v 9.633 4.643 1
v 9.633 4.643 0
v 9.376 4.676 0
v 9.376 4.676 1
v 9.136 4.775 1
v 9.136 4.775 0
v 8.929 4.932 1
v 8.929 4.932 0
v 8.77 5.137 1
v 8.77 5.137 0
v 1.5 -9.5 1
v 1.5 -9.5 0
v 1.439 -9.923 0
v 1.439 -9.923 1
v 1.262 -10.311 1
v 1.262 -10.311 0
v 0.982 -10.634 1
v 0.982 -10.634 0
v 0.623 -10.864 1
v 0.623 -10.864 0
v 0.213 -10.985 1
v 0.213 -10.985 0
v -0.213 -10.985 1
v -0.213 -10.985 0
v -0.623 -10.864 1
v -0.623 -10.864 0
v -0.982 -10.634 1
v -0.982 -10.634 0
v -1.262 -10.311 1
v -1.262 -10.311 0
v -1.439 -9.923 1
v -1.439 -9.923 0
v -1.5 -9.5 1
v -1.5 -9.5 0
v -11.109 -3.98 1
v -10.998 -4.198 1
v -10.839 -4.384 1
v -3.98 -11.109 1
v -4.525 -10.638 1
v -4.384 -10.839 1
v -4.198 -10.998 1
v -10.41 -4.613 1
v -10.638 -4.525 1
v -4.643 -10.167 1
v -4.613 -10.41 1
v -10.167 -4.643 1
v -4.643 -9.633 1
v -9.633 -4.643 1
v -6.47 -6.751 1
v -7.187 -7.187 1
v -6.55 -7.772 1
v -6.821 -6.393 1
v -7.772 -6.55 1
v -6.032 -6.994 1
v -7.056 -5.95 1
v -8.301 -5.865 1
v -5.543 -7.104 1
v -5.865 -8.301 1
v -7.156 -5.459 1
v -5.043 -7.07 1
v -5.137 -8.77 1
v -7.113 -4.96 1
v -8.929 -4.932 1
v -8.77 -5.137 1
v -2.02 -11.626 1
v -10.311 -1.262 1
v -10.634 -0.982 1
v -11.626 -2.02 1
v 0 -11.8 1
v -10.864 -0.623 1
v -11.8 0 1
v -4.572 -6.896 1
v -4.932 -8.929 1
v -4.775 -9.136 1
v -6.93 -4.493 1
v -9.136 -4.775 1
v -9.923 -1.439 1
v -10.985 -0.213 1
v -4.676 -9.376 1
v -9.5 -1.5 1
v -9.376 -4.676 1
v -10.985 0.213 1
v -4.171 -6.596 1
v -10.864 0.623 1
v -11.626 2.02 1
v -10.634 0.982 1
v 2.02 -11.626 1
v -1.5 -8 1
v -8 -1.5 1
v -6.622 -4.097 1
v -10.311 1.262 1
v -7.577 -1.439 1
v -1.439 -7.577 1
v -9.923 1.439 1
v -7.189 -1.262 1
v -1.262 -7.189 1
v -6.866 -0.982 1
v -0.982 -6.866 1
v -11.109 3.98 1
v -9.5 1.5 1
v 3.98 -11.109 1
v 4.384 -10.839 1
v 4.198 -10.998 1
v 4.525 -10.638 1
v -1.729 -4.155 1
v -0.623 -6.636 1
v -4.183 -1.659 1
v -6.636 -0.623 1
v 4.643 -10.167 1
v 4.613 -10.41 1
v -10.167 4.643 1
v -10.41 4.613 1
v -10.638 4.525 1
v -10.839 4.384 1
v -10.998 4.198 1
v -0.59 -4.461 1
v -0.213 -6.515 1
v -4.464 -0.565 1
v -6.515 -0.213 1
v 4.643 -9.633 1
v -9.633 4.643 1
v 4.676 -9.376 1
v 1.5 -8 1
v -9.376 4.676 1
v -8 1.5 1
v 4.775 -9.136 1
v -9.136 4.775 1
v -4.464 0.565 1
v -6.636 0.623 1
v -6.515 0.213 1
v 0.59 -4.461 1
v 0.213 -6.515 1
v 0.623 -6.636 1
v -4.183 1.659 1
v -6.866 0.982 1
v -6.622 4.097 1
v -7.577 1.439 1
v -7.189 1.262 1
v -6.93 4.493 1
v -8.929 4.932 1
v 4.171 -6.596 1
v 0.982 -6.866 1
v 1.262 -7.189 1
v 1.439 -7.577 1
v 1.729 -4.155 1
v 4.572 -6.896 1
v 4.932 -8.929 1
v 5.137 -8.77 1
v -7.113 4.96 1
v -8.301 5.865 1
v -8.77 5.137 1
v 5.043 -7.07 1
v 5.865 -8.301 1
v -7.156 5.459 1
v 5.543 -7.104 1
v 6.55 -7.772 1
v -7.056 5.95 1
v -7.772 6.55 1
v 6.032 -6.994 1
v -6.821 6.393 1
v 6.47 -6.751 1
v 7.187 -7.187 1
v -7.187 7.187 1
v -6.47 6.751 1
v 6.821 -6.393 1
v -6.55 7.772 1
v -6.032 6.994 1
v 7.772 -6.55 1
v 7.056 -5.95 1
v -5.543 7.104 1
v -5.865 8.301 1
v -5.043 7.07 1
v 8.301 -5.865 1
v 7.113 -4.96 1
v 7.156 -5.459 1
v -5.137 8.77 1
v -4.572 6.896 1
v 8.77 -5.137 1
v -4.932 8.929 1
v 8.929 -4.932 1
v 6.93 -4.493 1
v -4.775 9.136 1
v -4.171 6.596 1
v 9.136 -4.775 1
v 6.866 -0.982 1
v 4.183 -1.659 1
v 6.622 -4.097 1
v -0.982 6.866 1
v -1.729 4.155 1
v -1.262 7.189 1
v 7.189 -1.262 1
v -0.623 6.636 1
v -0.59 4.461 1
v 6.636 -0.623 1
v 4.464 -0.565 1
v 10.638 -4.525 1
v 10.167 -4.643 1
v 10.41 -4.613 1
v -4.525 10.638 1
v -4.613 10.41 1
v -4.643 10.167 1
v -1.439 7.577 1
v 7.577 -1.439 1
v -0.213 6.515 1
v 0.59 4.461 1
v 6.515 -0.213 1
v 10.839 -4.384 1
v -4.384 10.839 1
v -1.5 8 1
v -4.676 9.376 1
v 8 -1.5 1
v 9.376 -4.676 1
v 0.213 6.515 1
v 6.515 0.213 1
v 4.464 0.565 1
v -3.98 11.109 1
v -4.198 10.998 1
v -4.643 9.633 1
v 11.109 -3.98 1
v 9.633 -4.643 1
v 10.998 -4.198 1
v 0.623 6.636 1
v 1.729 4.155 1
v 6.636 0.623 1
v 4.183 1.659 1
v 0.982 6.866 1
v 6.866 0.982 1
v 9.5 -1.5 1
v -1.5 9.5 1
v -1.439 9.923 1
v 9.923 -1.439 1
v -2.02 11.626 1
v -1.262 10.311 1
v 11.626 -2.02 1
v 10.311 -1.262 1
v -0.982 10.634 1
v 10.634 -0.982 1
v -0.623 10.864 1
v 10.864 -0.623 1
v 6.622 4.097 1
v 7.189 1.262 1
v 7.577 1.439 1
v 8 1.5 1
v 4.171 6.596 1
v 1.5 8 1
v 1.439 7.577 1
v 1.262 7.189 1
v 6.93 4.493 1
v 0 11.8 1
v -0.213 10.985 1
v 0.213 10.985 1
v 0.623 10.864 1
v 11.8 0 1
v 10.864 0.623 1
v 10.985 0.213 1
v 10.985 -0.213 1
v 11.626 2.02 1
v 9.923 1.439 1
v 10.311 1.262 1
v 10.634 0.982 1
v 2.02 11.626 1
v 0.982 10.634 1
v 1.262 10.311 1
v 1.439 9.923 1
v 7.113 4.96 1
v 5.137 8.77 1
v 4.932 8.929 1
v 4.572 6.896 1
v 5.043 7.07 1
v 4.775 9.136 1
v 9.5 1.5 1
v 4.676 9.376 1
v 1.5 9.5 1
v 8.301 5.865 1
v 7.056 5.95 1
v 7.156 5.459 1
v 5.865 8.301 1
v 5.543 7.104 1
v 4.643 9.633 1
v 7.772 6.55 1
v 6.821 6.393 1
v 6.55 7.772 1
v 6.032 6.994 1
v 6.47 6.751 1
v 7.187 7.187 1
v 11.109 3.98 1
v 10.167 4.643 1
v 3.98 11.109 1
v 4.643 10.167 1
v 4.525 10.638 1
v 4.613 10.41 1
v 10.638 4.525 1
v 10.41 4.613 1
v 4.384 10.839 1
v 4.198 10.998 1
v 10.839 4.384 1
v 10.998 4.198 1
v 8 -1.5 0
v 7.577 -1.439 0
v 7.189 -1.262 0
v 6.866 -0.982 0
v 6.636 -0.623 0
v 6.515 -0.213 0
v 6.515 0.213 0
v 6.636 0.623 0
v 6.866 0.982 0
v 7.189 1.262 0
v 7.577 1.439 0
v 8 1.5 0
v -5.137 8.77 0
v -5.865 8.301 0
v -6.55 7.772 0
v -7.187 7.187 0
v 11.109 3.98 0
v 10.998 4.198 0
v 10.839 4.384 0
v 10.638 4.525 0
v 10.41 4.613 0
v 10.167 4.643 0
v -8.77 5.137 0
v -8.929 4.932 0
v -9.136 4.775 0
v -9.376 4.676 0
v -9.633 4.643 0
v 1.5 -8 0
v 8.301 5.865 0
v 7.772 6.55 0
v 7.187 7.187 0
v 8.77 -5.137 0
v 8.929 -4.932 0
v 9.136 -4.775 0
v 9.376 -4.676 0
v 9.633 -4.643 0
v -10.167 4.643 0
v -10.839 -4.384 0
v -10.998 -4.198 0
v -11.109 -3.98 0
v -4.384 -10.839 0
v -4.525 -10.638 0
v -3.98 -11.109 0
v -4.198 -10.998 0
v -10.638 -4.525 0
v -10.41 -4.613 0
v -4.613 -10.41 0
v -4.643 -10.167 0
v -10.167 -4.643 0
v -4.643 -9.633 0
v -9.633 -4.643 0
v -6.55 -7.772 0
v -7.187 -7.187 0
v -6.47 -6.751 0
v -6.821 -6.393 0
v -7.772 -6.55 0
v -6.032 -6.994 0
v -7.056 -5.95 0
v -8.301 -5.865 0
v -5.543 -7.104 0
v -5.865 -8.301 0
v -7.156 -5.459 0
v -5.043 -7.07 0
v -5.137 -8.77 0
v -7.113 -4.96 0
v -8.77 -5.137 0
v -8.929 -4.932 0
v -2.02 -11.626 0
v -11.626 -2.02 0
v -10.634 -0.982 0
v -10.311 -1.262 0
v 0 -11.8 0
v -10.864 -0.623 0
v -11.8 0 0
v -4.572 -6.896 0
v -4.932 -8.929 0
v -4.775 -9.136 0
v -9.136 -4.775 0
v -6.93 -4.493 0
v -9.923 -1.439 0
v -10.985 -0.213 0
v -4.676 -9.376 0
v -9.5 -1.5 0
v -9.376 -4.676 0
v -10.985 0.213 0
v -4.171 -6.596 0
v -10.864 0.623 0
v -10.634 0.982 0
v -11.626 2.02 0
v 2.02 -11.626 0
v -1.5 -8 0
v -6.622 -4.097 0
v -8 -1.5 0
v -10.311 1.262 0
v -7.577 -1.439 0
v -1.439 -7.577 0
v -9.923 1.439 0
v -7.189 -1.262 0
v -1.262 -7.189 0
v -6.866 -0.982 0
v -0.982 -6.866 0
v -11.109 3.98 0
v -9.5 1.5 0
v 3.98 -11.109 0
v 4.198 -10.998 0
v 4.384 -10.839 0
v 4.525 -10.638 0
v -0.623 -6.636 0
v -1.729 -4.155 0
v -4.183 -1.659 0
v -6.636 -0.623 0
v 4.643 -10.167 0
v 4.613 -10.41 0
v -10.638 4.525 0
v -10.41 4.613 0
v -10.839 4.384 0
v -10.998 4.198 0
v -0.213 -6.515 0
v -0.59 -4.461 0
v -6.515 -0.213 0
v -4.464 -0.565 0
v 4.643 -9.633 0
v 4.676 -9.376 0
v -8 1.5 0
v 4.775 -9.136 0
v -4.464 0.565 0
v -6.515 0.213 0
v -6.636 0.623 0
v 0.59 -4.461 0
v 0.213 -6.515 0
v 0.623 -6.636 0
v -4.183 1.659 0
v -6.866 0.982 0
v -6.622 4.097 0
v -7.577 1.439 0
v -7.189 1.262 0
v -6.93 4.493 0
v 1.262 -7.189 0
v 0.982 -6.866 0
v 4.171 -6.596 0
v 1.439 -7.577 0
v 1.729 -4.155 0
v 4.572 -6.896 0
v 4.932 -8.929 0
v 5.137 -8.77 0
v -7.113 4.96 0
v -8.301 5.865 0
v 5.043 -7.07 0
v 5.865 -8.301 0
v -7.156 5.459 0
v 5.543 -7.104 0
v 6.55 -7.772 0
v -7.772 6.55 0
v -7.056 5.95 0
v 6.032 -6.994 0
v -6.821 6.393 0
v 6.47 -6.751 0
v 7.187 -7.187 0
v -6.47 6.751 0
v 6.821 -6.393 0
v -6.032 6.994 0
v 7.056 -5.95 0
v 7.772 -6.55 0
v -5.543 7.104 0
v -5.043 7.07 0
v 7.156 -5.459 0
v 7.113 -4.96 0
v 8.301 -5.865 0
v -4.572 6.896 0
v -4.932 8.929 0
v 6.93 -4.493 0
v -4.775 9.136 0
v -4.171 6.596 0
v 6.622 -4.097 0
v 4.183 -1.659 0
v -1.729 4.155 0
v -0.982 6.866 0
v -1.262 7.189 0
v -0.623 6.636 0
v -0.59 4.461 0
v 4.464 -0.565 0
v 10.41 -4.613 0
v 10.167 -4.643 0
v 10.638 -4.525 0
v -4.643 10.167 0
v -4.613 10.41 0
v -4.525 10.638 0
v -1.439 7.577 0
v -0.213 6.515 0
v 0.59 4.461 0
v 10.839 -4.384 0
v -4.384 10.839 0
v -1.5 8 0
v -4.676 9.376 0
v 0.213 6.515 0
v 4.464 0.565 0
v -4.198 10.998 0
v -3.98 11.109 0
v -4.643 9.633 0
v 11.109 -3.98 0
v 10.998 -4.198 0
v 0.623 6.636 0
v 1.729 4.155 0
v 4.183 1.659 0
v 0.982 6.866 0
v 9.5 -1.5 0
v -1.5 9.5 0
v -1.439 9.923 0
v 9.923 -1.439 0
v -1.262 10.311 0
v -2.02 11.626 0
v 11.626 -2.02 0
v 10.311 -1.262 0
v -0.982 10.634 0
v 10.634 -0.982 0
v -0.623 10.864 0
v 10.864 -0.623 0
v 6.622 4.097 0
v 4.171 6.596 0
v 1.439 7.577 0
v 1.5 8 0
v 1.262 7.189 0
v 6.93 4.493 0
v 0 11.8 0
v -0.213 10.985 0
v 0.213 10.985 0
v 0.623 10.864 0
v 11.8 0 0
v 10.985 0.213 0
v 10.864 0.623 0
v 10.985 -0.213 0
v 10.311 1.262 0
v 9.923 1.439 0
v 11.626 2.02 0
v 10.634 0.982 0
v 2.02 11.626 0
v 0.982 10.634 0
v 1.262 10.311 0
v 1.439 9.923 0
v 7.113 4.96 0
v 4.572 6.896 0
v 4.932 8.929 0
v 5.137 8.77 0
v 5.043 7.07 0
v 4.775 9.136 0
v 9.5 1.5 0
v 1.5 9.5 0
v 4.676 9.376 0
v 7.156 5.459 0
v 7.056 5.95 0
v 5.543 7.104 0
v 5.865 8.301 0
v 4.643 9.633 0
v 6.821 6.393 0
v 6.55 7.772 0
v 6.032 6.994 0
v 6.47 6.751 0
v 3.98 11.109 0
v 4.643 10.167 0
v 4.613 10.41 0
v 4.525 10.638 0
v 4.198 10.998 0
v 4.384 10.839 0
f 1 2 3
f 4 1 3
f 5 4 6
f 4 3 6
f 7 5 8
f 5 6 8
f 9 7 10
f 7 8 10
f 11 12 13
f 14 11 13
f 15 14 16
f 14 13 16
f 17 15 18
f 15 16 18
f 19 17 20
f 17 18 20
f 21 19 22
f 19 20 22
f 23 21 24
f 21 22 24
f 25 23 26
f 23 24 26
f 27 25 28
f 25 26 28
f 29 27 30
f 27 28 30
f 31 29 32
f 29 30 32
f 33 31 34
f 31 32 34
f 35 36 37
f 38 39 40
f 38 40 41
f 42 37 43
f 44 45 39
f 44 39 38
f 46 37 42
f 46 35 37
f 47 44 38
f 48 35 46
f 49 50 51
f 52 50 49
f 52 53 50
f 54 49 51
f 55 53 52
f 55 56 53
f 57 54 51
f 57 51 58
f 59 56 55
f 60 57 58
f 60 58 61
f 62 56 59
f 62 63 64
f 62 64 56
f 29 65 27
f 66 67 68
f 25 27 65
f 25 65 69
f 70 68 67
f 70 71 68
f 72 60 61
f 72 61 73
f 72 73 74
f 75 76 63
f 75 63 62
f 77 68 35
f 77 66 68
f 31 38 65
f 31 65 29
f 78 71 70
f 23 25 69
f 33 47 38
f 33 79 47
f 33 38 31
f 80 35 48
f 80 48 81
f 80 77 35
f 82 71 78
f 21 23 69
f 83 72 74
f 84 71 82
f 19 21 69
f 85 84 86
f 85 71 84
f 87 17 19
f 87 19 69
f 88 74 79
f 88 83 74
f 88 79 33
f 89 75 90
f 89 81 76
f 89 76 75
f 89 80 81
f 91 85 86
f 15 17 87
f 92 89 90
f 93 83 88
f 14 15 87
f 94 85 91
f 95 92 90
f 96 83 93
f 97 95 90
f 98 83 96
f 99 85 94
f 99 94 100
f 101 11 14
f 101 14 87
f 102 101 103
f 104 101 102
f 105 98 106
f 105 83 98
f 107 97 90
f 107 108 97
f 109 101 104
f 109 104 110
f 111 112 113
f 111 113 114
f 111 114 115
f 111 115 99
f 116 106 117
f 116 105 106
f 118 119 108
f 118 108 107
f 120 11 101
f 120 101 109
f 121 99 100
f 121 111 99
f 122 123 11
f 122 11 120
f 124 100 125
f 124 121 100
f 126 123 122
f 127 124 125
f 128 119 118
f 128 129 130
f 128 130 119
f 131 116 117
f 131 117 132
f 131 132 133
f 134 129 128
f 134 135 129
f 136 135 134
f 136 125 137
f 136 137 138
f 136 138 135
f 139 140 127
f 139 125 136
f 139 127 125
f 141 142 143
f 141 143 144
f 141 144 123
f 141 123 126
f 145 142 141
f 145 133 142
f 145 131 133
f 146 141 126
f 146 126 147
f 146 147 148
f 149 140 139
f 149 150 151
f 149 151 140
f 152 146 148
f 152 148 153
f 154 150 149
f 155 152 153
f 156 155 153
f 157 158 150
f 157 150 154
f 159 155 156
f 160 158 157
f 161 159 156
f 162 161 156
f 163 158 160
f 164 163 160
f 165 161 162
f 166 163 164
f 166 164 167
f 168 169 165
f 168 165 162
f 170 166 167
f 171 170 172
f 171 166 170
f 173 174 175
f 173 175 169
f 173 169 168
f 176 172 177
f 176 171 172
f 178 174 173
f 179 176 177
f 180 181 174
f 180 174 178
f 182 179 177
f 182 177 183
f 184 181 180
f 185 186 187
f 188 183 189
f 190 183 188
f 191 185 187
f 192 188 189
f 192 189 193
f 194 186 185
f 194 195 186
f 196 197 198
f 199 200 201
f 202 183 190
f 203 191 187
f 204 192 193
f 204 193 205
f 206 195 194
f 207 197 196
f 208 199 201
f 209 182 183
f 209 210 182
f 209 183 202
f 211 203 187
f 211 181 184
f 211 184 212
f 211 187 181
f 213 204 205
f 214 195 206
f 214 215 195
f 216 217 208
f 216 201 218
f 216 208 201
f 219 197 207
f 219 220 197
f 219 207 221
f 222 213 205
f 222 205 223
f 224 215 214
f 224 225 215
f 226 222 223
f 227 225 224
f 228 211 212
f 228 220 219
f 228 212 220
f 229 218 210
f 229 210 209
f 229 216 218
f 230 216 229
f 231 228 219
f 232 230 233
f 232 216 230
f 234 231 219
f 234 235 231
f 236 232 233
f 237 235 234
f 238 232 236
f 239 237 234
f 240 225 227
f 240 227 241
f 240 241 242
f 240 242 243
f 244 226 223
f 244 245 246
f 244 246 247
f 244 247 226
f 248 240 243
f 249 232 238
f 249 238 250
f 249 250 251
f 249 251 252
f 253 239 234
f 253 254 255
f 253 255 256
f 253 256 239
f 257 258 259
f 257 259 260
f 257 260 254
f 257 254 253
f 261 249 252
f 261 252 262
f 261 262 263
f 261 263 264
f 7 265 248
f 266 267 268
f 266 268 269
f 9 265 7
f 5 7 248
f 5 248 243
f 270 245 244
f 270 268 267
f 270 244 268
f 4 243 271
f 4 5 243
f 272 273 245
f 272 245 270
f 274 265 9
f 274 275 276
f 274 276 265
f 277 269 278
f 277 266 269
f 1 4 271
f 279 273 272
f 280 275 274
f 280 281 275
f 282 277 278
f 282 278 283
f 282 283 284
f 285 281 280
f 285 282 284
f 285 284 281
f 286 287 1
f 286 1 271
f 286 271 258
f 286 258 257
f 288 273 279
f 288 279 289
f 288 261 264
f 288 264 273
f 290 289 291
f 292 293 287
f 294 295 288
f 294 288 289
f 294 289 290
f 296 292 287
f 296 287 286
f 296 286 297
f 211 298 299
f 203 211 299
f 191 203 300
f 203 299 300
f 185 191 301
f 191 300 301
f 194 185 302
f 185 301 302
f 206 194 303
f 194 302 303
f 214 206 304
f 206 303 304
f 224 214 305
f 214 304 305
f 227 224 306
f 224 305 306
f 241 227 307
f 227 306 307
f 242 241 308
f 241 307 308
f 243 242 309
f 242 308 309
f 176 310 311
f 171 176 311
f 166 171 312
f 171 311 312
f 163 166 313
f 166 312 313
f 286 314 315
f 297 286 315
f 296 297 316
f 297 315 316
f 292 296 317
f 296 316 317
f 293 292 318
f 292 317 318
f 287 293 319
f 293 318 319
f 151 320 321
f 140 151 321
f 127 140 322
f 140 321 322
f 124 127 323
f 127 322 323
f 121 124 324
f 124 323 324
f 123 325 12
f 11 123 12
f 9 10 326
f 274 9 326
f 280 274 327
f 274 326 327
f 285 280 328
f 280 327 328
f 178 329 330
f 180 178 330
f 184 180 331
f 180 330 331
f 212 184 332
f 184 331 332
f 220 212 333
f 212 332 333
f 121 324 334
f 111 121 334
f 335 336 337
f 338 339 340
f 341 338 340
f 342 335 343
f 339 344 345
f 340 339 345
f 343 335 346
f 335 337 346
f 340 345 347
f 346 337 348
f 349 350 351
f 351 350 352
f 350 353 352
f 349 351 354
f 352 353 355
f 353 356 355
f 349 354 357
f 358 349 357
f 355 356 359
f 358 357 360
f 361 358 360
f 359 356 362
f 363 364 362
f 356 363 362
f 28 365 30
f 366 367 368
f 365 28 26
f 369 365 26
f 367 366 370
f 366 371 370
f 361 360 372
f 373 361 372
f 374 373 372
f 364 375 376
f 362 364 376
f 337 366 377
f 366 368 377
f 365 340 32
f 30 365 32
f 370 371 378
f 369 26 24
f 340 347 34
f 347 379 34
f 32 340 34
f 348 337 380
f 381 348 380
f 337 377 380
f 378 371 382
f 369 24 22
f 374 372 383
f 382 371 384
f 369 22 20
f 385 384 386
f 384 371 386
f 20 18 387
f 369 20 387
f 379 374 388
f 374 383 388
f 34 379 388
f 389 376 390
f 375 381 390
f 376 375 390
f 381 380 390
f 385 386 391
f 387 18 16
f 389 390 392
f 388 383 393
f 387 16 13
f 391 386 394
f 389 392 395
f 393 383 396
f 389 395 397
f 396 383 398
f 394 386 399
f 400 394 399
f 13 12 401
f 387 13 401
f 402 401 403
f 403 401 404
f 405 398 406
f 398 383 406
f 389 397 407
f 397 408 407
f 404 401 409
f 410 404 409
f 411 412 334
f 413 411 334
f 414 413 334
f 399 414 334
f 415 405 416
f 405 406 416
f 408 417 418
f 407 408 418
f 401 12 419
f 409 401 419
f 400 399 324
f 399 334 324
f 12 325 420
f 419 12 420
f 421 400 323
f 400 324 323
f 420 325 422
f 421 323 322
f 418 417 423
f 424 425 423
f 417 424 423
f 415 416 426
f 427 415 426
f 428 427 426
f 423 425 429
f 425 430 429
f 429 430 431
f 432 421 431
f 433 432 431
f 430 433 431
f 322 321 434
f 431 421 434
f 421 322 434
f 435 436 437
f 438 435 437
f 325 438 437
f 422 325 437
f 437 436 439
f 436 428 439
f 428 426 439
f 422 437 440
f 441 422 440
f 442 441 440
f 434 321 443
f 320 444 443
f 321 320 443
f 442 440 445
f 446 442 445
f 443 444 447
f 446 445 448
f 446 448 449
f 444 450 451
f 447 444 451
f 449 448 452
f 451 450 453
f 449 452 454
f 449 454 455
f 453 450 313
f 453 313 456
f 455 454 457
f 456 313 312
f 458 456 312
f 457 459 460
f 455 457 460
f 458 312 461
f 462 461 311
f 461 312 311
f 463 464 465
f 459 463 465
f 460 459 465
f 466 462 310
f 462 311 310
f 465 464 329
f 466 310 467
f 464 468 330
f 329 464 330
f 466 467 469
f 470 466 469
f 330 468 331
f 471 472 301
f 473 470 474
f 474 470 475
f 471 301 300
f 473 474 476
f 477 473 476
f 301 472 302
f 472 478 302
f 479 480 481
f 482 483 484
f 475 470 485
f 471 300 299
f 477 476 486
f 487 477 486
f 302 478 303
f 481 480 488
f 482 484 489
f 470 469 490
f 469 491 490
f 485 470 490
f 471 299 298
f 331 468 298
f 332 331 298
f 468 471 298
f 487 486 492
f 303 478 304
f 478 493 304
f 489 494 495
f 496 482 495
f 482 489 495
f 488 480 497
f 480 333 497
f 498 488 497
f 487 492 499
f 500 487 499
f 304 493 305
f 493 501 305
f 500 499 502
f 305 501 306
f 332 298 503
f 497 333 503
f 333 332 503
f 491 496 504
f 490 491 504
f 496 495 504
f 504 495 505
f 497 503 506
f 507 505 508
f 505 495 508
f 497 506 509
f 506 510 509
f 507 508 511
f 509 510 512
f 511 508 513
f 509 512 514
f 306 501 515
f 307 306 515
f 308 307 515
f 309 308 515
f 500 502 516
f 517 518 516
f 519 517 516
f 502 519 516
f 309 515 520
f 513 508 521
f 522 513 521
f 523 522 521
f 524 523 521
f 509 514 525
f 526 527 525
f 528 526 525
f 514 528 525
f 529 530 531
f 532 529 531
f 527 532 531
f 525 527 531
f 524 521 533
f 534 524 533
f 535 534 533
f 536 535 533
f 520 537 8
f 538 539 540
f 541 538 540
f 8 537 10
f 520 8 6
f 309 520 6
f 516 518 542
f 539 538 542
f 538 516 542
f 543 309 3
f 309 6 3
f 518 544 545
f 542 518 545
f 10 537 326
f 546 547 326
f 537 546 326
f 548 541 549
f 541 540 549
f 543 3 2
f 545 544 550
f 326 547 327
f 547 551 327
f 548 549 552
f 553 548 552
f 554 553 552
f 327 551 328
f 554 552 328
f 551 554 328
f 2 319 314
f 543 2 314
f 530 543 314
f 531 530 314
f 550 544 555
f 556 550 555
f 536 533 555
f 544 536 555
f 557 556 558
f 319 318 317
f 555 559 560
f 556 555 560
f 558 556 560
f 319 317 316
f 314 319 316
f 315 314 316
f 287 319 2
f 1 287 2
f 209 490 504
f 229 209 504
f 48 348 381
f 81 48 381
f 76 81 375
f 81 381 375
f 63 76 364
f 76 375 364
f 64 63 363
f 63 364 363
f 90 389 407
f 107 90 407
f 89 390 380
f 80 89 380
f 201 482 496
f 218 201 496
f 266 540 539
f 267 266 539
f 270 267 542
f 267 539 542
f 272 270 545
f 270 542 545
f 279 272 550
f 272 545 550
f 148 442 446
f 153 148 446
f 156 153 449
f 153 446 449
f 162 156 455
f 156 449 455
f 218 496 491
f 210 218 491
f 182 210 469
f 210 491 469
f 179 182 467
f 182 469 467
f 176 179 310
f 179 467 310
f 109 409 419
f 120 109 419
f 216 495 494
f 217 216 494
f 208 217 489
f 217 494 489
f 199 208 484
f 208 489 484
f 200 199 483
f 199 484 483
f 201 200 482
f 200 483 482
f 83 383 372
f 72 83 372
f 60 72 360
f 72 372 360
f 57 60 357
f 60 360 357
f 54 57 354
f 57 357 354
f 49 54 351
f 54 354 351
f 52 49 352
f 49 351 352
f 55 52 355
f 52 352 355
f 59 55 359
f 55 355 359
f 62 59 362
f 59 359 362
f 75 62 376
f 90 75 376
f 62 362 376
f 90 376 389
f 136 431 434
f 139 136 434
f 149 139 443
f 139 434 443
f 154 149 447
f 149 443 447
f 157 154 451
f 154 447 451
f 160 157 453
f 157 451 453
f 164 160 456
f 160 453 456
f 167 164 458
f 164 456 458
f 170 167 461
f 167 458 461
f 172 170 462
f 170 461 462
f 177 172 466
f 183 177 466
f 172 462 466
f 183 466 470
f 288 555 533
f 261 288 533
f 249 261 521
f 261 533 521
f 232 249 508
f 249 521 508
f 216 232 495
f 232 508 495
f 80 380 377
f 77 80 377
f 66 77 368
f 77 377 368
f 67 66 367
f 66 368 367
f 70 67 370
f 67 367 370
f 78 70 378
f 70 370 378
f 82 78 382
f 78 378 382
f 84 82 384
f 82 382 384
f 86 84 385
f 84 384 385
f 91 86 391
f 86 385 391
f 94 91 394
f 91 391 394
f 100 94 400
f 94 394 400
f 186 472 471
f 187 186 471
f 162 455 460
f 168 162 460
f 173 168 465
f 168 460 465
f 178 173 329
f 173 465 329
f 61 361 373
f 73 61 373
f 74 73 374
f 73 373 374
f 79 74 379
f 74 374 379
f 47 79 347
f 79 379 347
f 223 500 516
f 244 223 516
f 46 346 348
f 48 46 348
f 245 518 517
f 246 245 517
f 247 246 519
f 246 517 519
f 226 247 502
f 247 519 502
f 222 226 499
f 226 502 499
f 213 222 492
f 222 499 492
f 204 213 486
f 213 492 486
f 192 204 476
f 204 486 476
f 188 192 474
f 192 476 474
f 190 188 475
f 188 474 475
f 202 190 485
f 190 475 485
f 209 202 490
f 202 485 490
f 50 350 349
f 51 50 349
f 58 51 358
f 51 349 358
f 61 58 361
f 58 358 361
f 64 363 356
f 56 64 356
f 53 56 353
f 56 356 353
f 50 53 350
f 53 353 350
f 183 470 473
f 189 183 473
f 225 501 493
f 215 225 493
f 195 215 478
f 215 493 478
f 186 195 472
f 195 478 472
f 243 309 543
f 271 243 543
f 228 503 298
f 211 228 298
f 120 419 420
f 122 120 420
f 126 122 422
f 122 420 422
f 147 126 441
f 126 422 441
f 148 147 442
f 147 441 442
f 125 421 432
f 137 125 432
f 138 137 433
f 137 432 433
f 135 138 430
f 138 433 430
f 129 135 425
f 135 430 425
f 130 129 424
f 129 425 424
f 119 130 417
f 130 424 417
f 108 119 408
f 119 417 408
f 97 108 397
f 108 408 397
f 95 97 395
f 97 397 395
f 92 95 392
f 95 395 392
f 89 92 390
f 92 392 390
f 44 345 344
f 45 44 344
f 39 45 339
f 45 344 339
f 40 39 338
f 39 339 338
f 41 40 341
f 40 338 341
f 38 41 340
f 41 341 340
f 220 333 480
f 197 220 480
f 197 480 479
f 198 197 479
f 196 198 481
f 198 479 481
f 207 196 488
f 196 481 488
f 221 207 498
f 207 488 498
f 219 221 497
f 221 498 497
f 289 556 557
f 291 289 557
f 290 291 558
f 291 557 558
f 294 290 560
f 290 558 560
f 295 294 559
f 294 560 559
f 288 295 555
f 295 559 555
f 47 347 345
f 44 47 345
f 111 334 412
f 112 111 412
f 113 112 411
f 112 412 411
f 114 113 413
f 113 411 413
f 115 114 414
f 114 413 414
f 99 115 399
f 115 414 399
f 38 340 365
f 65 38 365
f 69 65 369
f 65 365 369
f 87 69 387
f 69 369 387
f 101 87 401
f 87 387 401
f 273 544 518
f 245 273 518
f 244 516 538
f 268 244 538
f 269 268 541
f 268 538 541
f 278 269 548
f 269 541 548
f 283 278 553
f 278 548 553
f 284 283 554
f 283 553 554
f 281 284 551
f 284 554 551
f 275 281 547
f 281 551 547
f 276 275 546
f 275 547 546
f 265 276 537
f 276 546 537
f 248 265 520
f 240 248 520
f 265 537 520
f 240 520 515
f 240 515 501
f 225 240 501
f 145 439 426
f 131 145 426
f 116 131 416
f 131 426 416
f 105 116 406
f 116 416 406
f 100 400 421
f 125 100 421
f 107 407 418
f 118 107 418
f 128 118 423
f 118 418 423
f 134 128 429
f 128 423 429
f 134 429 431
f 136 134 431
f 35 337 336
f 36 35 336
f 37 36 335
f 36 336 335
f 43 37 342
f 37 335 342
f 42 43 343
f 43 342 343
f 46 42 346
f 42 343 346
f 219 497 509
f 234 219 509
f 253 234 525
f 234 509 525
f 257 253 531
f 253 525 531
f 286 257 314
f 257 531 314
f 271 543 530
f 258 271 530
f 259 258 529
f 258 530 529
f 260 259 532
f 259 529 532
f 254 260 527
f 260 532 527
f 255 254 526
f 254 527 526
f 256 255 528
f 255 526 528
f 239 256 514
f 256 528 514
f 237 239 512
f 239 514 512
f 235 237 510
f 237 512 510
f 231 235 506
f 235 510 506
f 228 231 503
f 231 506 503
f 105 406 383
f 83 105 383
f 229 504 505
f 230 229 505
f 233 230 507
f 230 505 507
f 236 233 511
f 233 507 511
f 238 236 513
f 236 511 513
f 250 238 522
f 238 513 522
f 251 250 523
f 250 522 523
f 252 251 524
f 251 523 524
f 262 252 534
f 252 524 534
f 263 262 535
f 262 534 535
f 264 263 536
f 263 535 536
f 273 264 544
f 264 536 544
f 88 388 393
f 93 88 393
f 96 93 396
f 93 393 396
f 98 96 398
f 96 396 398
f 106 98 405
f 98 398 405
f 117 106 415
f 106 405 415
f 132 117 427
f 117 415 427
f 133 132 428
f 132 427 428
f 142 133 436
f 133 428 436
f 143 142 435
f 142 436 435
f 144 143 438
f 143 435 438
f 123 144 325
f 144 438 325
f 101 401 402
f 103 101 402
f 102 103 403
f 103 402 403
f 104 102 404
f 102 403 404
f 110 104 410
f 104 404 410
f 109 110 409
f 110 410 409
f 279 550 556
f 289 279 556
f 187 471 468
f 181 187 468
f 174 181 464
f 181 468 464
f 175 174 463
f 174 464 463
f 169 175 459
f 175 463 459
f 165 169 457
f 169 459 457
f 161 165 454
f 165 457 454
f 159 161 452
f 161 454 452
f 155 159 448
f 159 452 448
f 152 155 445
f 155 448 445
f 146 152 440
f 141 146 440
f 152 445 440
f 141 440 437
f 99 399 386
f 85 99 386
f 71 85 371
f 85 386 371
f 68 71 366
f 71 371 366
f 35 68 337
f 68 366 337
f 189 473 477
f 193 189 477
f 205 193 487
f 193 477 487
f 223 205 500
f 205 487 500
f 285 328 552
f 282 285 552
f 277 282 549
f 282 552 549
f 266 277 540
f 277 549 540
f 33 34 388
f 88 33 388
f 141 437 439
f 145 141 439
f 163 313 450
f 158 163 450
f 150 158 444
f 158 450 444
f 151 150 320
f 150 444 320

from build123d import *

# Parameters (mm, degrees)
F1_DEPTH = 1


with BuildPart() as f1:
    # F0 (on Top) → F1 (new body)
    with BuildSketch(Plane.XY):
        with BuildLine():
            ThreePointArc((4.64256, 10.16719), (4.460262, 10.742831), (3.979834, 11.108597))
            ThreePointArc((3.979834, 11.108597), (0, 11.8), (-3.979834, 11.108597))
            ThreePointArc((-3.979834, 11.108597), (-4.460262, 10.742831), (-4.64256, 10.16719))
            Line((-4.64256, 10.16719), (-4.64256, 9.633))
            ThreePointArc((-4.64256, 9.633), (-4.774969, 9.135722), (-5.137132, 8.770131))
            ThreePointArc((-5.137132, 8.770131), (-6.21269, 8.044117), (-7.186979, 7.186979))
            ThreePointArc((-7.186979, 7.186979), (-8.044117, 6.21269), (-8.770131, 5.137132))
            ThreePointArc((-8.770131, 5.137132), (-9.135722, 4.774969), (-9.633, 4.64256))
            Line((-9.633, 4.64256), (-10.16719, 4.64256))
            ThreePointArc((-10.16719, 4.64256), (-10.742831, 4.460262), (-11.108597, 3.979834))
            ThreePointArc((-11.108597, 3.979834), (-11.8, 0), (-11.108597, -3.979834))
            ThreePointArc((-11.108597, -3.979834), (-10.742831, -4.460262), (-10.16719, -4.64256))
            Line((-10.16719, -4.64256), (-9.633, -4.64256))
            ThreePointArc((-9.633, -4.64256), (-9.135722, -4.774969), (-8.770131, -5.137132))
            ThreePointArc((-8.770131, -5.137132), (-8.044117, -6.21269), (-7.186979, -7.186979))
            ThreePointArc((-7.186979, -7.186979), (-6.21269, -8.044117), (-5.137132, -8.770131))
            ThreePointArc((-5.137132, -8.770131), (-4.774969, -9.135722), (-4.64256, -9.633))
            Line((-4.64256, -9.633), (-4.64256, -10.16719))
            ThreePointArc((-4.64256, -10.16719), (-4.460262, -10.742831), (-3.979834, -11.108597))
            ThreePointArc((-3.979834, -11.108597), (0, -11.8), (3.979834, -11.108597))
            ThreePointArc((3.979834, -11.108597), (4.460262, -10.742831), (4.64256, -10.16719))
            Line((4.64256, -10.16719), (4.64256, -9.633))
            ThreePointArc((4.64256, -9.633), (4.774969, -9.135722), (5.137132, -8.770131))
            ThreePointArc((5.137132, -8.770131), (6.21269, -8.044117), (7.186979, -7.186979))
            ThreePointArc((7.186979, -7.186979), (8.044117, -6.21269), (8.770131, -5.137132))
            ThreePointArc((8.770131, -5.137132), (9.135722, -4.774969), (9.633, -4.64256))
            Line((9.633, -4.64256), (10.16719, -4.64256))
            ThreePointArc((10.16719, -4.64256), (10.742831, -4.460262), (11.108597, -3.979834))
            ThreePointArc((11.108597, -3.979834), (11.8, 0), (11.108597, 3.979834))
            ThreePointArc((11.108597, 3.979834), (10.742831, 4.460262), (10.16719, 4.64256))
            Line((10.16719, 4.64256), (9.633, 4.64256))
            ThreePointArc((9.633, 4.64256), (9.135722, 4.774969), (8.770131, 5.137132))
            ThreePointArc((8.770131, 5.137132), (8.044117, 6.21269), (7.186979, 7.186979))
            ThreePointArc((7.186979, 7.186979), (6.21269, 8.044117), (5.137132, 8.770131))
            ThreePointArc((5.137132, 8.770131), (4.774969, 9.135722), (4.64256, 9.633))
            Line((4.64256, 9.633), (4.64256, 10.16719))
        make_face()
        with BuildLine():
            ThreePointArc((-9.5, -1.5), (-11, 0), (-9.5, 1.5))
            Line((-9.5, 1.5), (-8, 1.5))
            ThreePointArc((-8, 1.5), (-6.5, 0), (-8, -1.5))
            Line((-8, -1.5), (-9.5, -1.5))
        make_face(mode=Mode.SUBTRACT)
        with BuildLine():
            Line((1.5, -8), (1.5, -9.5))
            ThreePointArc((1.5, -9.5), (0, -11), (-1.5, -9.5))
            Line((-1.5, -9.5), (-1.5, -8))
            ThreePointArc((-1.5, -8), (0, -6.5), (1.5, -8))
        make_face(mode=Mode.SUBTRACT)
        with BuildLine():
            Line((-4.17097, 6.596394), (-1.729112, 4.154536))
            ThreePointArc((-1.729112, 4.154536), (0, 4.5), (1.729112, 4.154536))
            Line((1.729112, 4.154536), (4.17097, 6.596394))
            ThreePointArc((4.17097, 6.596394), (6.65805, 6.584305), (6.621784, 4.097461))
            Line((6.621784, 4.097461), (4.183111, 1.658788))
            ThreePointArc((4.183111, 1.658788), (4.5, 0), (4.183111, -1.658788))
            Line((4.183111, -1.658788), (6.621784, -4.097461))
            ThreePointArc((6.621784, -4.097461), (6.65805, -6.584305), (4.17097, -6.596394))
            Line((4.17097, -6.596394), (1.729112, -4.154536))
            ThreePointArc((1.729112, -4.154536), (0, -4.5), (-1.729112, -4.154536))
            Line((-1.729112, -4.154536), (-4.17097, -6.596394))
            ThreePointArc((-4.17097, -6.596394), (-6.65805, -6.584305), (-6.621784, -4.097461))
            Line((-6.621784, -4.097461), (-4.183111, -1.658788))
            ThreePointArc((-4.183111, -1.658788), (-4.5, 0), (-4.183111, 1.658788))
            Line((-4.183111, 1.658788), (-6.621784, 4.097461))
            ThreePointArc((-6.621784, 4.097461), (-6.65805, 6.584305), (-4.17097, 6.596394))
        make_face(mode=Mode.SUBTRACT)
        with BuildLine():
            Line((8, 1.5), (9.5, 1.5))
            ThreePointArc((9.5, 1.5), (11, 0), (9.5, -1.5))
            Line((9.5, -1.5), (8, -1.5))
            ThreePointArc((8, -1.5), (6.5, 0), (8, 1.5))
        make_face(mode=Mode.SUBTRACT)
        with BuildLine():
            ThreePointArc((-1.5, 9.5), (0, 11), (1.5, 9.5))
            Line((1.5, 9.5), (1.5, 8))
            ThreePointArc((1.5, 8), (0, 6.5), (-1.5, 8))
            Line((-1.5, 8), (-1.5, 9.5))
        make_face(mode=Mode.SUBTRACT)
    extrude(amount=F1_DEPTH)


solid = f1.part
